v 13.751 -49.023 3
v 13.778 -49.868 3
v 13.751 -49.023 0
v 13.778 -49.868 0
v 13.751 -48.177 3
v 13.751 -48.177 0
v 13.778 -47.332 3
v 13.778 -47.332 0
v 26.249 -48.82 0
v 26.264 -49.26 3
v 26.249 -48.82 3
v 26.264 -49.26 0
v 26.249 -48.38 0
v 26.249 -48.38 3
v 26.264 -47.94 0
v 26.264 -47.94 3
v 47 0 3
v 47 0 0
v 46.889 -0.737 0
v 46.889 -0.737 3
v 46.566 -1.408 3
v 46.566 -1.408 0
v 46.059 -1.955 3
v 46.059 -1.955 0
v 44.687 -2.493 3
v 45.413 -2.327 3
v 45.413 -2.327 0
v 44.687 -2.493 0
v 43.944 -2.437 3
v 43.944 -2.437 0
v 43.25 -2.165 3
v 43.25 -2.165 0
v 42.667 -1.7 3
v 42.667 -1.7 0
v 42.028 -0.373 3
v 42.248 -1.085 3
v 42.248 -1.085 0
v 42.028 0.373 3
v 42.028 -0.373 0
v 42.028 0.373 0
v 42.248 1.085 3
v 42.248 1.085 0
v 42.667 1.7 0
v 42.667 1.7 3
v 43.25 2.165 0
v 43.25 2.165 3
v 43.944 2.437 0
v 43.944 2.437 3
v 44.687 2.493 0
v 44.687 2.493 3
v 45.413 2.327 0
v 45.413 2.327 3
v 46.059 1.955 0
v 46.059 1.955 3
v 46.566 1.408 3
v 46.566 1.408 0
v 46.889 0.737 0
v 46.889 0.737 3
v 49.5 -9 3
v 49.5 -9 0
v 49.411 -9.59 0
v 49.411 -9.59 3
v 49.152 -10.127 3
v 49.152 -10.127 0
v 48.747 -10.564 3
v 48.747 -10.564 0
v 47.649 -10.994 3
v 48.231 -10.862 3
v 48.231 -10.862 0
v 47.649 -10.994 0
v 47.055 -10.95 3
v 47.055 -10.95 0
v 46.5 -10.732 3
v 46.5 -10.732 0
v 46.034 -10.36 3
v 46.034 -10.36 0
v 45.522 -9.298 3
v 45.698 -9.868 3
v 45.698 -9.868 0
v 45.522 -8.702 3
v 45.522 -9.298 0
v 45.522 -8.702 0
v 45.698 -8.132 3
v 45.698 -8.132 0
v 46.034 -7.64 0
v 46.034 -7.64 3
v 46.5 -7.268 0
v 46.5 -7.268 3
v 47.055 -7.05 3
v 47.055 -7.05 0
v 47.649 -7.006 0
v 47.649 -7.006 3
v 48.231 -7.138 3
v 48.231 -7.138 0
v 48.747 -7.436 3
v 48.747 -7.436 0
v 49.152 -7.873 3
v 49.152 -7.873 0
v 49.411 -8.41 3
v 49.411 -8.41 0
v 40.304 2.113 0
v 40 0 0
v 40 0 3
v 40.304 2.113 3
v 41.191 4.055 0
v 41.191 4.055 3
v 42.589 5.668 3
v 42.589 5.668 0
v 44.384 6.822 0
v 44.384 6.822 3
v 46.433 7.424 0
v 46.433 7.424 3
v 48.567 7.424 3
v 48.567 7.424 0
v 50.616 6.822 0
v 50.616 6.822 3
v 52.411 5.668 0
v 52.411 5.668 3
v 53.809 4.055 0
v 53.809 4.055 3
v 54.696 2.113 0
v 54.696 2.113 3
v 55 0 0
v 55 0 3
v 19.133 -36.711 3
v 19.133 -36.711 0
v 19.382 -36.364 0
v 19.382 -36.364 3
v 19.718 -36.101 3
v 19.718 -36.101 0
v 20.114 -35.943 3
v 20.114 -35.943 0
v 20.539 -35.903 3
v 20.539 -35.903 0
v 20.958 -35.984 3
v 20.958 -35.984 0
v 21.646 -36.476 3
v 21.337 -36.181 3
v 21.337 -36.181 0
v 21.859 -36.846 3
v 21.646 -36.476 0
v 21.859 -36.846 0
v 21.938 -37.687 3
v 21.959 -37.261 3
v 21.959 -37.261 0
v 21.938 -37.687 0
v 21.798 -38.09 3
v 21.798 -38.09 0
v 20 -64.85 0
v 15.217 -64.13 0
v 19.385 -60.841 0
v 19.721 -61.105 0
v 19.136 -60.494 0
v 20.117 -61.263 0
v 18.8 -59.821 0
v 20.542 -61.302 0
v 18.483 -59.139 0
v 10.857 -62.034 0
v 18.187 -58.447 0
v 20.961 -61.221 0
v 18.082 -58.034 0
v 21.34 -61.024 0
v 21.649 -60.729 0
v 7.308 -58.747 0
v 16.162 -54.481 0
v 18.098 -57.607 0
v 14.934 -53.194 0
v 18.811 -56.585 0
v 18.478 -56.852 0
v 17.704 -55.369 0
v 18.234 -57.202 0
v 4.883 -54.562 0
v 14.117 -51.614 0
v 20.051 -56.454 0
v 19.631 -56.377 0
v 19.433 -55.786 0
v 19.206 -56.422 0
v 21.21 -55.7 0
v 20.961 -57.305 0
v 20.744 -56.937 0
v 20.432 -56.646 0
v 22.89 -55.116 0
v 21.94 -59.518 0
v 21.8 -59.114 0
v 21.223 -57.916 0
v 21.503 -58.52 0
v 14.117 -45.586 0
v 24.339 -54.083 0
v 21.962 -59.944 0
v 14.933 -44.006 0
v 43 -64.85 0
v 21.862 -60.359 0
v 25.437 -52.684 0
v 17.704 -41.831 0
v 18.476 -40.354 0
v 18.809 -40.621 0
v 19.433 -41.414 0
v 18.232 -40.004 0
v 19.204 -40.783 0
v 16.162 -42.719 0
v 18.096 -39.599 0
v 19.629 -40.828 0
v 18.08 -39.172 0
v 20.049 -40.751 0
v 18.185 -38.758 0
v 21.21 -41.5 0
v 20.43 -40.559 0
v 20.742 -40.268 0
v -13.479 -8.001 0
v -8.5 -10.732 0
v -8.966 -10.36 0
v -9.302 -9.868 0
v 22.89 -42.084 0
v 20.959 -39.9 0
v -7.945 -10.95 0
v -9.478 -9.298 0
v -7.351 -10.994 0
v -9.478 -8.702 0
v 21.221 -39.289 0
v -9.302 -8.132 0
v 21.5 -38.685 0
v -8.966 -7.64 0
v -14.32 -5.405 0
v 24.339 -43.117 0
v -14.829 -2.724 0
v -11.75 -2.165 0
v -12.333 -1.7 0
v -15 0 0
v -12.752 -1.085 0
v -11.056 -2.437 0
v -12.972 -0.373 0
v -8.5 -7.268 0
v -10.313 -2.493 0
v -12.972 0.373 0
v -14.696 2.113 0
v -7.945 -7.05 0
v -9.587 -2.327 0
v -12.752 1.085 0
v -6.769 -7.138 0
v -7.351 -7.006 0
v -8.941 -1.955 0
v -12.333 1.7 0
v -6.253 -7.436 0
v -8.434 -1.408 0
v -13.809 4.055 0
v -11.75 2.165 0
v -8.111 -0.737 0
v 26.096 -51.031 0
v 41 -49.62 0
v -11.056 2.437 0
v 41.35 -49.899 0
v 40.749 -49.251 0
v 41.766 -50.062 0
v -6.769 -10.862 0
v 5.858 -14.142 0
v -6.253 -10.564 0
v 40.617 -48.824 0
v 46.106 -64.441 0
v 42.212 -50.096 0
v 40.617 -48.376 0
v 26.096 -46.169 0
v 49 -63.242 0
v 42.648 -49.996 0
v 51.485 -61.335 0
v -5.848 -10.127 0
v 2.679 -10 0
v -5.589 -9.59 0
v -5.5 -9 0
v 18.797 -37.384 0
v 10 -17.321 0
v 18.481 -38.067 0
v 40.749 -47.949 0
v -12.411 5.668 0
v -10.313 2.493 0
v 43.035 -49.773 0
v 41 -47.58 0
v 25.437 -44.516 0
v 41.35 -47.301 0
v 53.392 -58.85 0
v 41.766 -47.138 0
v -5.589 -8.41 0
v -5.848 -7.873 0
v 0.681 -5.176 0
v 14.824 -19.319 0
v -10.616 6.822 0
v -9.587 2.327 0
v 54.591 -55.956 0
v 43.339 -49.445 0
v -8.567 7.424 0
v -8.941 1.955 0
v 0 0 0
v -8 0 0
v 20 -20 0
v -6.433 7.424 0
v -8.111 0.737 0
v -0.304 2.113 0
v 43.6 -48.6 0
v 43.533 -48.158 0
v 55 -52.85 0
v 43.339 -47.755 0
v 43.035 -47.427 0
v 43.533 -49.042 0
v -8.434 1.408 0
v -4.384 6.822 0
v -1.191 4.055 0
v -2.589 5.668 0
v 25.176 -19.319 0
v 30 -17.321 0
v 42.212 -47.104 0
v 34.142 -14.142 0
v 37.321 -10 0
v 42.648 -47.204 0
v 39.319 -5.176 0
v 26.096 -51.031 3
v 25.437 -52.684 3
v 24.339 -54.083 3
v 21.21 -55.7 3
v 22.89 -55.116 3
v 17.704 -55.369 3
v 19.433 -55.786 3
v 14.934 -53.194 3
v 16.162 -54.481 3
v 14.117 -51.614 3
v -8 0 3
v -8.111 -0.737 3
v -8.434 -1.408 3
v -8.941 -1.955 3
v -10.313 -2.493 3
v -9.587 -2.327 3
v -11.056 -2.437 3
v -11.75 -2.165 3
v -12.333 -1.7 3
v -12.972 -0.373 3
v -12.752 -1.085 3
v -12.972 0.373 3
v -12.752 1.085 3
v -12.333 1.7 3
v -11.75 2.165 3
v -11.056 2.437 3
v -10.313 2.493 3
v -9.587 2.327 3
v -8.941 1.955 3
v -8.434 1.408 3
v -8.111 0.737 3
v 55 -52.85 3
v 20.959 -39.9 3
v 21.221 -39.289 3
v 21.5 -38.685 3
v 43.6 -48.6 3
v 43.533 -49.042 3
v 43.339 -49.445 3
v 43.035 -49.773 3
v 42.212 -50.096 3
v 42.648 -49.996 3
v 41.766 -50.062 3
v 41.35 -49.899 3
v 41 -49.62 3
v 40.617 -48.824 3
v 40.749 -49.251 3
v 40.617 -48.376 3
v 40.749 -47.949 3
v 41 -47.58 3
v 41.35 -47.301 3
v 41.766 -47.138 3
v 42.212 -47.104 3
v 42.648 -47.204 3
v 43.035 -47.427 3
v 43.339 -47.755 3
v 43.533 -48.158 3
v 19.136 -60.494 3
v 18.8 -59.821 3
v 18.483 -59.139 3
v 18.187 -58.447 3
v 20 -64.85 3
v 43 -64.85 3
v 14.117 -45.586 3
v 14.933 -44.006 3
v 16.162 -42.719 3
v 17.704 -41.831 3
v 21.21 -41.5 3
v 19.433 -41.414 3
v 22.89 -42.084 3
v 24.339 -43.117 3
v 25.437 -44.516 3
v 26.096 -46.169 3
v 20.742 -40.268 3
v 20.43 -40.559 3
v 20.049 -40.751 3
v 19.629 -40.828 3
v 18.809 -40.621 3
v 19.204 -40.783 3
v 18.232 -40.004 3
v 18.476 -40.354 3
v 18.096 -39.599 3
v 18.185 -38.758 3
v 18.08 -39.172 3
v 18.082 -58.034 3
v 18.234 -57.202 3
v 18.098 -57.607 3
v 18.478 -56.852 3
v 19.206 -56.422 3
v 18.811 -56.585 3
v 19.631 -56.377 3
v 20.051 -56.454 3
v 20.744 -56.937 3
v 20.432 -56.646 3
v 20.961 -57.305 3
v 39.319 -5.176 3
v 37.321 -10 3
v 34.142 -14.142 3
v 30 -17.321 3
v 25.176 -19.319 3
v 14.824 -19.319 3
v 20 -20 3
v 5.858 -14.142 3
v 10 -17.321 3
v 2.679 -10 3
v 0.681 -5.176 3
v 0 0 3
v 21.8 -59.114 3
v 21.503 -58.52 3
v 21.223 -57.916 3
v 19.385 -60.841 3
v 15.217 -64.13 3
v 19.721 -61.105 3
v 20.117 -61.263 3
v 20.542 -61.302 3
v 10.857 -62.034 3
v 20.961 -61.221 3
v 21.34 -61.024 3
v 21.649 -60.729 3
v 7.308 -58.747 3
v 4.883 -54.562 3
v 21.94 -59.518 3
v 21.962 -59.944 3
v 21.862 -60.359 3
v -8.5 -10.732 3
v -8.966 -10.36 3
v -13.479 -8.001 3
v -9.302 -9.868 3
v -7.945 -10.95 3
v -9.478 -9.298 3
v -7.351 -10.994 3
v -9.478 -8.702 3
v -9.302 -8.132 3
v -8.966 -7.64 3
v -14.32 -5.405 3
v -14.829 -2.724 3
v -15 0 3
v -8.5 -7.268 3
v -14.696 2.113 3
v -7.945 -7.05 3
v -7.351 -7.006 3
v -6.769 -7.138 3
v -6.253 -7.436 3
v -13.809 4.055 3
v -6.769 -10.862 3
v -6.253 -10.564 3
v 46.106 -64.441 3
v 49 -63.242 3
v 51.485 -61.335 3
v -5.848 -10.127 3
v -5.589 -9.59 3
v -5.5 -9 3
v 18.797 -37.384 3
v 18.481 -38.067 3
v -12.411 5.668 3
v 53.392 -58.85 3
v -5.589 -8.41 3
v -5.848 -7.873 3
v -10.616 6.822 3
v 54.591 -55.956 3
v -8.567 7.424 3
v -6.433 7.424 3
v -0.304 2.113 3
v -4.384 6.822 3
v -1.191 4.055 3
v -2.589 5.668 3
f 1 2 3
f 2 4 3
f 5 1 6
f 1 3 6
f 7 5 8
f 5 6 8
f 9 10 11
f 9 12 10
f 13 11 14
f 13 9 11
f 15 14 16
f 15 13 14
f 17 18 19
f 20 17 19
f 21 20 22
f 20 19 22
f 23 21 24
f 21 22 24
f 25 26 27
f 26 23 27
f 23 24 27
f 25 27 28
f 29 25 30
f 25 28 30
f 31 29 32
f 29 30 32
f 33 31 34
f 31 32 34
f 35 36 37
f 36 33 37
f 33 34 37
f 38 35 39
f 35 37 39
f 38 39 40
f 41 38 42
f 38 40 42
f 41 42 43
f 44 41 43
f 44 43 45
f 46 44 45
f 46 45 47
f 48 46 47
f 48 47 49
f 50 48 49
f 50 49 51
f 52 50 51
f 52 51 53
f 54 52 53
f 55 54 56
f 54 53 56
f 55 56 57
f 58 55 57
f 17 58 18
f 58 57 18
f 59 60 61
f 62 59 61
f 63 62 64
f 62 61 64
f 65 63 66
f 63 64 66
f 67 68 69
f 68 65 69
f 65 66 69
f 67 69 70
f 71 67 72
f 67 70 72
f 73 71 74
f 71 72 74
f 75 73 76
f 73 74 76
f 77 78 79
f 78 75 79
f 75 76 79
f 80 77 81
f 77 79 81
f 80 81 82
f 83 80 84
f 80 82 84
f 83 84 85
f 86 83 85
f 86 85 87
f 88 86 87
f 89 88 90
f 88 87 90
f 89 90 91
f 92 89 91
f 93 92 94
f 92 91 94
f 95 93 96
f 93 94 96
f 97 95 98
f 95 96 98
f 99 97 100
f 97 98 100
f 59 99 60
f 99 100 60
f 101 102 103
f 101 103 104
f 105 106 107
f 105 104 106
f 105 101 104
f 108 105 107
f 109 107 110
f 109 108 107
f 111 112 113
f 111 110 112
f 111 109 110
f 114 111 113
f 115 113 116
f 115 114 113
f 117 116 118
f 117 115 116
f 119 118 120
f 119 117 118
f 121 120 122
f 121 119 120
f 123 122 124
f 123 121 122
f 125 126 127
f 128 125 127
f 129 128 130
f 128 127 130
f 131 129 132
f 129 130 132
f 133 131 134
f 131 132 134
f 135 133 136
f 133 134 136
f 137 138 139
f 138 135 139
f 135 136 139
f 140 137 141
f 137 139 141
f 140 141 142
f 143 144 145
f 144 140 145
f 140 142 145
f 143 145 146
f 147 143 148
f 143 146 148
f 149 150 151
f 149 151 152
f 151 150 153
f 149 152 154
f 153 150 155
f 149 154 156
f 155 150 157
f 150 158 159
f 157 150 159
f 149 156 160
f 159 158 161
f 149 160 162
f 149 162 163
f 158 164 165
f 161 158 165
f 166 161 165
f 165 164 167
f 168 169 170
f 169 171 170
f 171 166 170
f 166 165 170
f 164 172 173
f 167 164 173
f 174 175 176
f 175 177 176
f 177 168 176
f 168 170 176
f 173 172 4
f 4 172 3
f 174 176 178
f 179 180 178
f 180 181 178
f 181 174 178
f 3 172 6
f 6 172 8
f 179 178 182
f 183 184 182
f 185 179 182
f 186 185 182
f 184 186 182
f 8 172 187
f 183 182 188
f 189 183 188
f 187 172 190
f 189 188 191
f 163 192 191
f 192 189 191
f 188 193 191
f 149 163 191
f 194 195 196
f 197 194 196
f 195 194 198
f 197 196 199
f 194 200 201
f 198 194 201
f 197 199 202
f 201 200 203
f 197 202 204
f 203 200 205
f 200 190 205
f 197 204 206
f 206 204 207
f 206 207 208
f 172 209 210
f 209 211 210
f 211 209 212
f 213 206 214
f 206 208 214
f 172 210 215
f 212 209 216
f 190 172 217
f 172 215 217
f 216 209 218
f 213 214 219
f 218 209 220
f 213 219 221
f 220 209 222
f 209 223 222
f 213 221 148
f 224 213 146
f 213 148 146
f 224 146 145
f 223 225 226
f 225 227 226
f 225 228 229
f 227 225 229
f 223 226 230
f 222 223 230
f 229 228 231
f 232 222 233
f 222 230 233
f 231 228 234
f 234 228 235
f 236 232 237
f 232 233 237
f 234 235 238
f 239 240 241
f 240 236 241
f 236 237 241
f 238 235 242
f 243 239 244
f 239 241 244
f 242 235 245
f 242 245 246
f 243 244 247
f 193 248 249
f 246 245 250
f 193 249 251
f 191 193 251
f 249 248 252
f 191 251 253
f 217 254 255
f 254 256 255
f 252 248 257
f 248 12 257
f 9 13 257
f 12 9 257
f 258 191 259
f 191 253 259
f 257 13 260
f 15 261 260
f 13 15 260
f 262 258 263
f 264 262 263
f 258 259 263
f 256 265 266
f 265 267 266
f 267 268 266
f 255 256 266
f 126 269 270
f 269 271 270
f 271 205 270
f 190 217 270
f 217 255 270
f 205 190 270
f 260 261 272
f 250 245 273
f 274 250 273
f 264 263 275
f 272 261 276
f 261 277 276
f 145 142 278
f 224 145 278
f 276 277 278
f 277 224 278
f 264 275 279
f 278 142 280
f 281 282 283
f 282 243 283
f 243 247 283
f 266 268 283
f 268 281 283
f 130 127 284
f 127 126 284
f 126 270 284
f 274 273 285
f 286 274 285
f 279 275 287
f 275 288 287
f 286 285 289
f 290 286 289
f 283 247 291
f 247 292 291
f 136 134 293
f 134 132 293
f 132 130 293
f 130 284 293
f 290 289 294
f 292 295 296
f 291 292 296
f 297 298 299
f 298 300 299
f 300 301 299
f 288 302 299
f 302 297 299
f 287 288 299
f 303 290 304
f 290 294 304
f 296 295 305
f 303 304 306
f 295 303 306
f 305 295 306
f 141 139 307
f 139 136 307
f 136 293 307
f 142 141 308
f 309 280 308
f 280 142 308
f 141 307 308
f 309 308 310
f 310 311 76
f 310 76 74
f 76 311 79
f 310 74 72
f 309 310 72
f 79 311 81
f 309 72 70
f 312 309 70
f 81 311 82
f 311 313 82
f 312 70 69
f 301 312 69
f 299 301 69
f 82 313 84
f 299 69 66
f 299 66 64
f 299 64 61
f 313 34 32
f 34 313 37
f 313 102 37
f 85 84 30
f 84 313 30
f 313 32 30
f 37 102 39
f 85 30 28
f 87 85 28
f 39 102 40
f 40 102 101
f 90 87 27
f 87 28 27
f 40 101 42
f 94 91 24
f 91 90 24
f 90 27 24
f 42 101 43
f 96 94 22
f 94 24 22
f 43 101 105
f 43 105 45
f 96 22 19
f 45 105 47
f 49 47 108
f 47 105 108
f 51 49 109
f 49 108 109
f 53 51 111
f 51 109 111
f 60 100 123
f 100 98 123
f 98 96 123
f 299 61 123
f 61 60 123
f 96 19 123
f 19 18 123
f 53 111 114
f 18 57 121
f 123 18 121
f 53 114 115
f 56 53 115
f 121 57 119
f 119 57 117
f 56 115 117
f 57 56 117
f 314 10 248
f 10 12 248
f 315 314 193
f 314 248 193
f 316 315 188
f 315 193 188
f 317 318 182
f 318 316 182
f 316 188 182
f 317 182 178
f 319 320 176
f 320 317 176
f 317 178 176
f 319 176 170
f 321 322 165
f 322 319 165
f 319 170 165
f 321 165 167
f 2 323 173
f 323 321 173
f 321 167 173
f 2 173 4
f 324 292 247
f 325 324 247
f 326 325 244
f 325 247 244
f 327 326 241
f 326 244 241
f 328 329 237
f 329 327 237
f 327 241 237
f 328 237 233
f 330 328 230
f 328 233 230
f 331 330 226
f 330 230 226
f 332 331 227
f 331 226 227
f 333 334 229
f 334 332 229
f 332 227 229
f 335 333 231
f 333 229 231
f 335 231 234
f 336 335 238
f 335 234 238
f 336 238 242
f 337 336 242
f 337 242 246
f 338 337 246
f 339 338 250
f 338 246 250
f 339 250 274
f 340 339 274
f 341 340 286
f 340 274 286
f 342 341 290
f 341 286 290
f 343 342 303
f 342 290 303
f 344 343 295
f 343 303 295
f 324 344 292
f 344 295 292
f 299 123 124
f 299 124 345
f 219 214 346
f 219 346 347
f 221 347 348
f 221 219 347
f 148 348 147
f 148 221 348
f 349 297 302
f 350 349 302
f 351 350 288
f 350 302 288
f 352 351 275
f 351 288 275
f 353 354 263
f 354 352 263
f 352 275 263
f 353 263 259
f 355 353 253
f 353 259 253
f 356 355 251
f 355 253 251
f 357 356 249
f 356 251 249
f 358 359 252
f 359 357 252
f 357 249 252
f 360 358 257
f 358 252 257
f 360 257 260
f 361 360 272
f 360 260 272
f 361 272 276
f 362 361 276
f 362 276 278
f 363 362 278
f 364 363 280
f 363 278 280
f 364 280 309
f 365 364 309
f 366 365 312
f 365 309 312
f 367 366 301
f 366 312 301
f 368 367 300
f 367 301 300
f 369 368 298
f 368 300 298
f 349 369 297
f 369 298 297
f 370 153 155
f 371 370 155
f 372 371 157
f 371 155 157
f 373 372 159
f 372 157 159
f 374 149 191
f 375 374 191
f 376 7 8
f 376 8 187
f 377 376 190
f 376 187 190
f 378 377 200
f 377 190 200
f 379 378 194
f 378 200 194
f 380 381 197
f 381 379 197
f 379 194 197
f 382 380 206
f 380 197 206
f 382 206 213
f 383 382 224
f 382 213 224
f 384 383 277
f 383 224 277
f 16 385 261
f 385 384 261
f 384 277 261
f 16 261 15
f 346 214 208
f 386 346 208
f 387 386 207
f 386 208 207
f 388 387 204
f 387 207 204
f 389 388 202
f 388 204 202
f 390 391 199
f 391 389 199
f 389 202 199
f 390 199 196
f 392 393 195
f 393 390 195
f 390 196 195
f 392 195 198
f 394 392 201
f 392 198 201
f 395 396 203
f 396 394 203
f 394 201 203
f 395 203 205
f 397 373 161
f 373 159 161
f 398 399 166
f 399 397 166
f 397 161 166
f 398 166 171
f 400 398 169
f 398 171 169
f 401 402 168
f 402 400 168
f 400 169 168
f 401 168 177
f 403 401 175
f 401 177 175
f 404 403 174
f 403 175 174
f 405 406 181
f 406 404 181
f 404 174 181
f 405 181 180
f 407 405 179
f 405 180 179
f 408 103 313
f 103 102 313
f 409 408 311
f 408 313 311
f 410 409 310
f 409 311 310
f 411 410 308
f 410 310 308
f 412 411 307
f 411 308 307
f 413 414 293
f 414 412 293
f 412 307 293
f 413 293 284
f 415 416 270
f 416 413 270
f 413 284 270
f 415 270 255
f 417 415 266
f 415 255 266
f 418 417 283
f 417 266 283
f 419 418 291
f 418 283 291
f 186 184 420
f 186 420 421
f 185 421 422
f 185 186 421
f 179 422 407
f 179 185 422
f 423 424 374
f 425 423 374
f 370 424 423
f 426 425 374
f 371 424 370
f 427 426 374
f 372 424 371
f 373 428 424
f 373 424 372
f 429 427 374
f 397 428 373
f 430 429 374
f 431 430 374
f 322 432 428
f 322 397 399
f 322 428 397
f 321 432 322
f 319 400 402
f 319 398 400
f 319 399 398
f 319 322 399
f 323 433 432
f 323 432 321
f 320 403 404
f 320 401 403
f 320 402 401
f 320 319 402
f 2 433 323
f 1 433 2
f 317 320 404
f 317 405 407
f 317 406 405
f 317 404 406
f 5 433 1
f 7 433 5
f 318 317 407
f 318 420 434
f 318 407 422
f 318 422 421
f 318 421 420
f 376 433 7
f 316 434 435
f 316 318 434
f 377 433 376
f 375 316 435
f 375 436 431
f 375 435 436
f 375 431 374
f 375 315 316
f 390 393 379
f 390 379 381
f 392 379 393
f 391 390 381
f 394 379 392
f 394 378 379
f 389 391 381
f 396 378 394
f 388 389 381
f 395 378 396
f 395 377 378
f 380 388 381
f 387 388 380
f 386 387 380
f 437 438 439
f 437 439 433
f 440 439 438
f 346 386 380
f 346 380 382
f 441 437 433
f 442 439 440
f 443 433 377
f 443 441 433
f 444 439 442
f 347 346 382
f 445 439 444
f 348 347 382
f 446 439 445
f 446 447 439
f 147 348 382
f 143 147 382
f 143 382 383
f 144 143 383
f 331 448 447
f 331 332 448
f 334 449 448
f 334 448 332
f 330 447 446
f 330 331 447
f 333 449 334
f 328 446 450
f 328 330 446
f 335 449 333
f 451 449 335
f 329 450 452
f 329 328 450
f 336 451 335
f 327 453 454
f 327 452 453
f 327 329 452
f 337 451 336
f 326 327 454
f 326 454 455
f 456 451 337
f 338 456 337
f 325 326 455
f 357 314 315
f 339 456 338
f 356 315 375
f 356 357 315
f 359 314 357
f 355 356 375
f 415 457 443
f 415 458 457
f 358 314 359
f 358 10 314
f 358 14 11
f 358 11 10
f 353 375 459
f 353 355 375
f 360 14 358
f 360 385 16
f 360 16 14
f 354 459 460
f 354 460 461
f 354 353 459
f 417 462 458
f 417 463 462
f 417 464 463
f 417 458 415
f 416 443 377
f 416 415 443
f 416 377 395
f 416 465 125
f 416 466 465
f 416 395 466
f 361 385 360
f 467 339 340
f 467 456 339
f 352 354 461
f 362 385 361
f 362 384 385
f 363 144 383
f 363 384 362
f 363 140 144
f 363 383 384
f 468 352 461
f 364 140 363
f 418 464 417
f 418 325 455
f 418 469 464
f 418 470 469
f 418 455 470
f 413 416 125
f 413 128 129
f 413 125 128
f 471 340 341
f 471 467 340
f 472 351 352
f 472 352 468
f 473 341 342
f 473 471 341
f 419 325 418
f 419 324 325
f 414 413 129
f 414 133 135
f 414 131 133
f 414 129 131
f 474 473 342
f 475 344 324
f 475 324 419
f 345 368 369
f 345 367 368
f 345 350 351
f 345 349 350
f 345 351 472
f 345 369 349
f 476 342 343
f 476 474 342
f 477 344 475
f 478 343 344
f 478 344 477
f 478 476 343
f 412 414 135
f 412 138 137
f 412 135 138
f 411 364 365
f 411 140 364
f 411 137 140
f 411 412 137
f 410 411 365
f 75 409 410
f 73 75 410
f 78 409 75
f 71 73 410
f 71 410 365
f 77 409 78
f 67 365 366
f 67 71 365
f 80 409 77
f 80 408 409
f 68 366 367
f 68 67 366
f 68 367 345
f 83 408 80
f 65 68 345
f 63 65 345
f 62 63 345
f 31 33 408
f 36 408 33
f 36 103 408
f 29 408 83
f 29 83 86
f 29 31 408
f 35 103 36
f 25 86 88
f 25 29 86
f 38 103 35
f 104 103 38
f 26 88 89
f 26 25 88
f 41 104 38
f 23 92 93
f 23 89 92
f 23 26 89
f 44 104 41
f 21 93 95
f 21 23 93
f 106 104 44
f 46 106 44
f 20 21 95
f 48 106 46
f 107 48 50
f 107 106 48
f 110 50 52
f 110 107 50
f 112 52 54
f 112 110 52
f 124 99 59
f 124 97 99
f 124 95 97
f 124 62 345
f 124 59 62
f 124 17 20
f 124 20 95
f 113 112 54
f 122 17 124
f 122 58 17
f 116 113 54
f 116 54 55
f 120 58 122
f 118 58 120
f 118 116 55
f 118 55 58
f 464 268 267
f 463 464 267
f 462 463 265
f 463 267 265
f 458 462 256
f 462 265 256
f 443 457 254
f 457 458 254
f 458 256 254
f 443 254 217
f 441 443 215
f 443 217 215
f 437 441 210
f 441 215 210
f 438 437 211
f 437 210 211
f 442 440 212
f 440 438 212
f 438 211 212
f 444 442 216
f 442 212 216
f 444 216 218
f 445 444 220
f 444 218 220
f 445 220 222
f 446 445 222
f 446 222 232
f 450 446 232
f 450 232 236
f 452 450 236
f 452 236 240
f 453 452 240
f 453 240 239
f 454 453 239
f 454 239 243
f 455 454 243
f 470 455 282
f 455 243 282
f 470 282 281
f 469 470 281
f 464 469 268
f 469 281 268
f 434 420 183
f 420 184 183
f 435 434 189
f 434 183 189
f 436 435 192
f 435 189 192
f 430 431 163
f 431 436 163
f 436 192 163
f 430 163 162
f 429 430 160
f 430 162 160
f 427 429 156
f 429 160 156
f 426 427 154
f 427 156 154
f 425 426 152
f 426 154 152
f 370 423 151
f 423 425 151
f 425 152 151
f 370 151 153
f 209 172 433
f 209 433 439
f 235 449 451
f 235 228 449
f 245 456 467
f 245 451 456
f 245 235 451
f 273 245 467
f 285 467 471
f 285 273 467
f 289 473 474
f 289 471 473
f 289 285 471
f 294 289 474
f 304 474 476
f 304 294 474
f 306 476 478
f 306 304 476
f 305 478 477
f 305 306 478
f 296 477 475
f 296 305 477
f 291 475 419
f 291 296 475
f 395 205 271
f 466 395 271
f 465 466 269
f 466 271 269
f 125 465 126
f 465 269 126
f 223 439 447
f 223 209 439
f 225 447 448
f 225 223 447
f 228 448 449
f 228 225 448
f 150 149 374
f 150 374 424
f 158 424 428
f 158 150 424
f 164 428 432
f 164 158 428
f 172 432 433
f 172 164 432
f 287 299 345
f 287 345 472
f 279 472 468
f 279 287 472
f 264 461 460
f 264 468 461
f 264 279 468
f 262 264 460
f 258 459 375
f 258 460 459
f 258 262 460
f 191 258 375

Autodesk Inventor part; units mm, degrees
ref_plane "YZ Plane" through (0, 0, 0) normal (1, 0, 0) x (0, 1, 0)
ref_plane "XZ Plane" through (0, 0, 0) normal (0, 1, 0) x (-1, 0, 0)
ref_plane "XY Plane" through (0, 0, 0) normal (0, 0, 1) x (1, 0, 0)
sketch "Sketch1" plane through (0, 0, 0) normal (0, 0, 1) x (1, 0, 0)
  line L0 (-15, 13.1624) -> (0, 13.1624) construction
  line L1 (-15, -13.1624) -> (-15, 13.1624) construction
  line L2 (0, -13.1624) -> (-15, -13.1624) construction
  line L3 (0, 13.1624) -> (0, -13.1624) construction
  circle A0 centre (20, -58.85) radius 1.2295 construction
  circle A1 centre (20, -38.35) radius 1.2295 construction
  circle A2 centre (42.1, -48.6) radius 1.2295 construction
  circle A3 centre (20, -48.6) radius 6 construction
  circle A4 centre (20, 0) radius 4 construction
  line L4 (40, 13.1624) -> (55, 13.1624) construction
  line L5 (40, -13.1624) -> (40, 13.1624) construction
  line L6 (55, -13.1624) -> (40, -13.1624) construction
  line L7 (55, 13.1624) -> (55, -13.1624) construction
  arc A5 (0, 0) -> (-15, 0) centre (-7.5, 0) ccw
  arc A6 (55, 0) -> (40, 0) centre (47.5, 0) ccw
  arc A7 (0, 0) -> (40, 0) centre (20, 0) ccw
  line L8 (53.51, -48.6) -> (3.95, -48.6) construction
  line L9 (20, -64.85) -> (43, -64.85)
  line L10 (55, 0) -> (55, -52.85)
  arc A8 (43, -64.85) -> (55, -52.85) centre (43, -52.85) ccw
  line L11 (4.8831, -54.5617) -> (-13.4793, -8.001)
  arc A9 (4.8831, -54.5617) -> (20, -64.85) centre (20, -48.6) ccw
  arc A10 (-15, 0) -> (-13.4793, -8.001) centre (6.8084, 0) ccw
  circle A11 centre (42.1, -48.6) radius 1.5
  arc A12 (19.1333, -36.7114) -> (18.1846, -38.7583) centre (42.1, -48.6) ccw
  arc A13 (21.7975, -38.0905) -> (20.9588, -39.9) centre (42.1, -48.6) ccw
  arc A14 (20.9609, -57.3051) -> (21.8001, -59.1144) centre (42.1, -48.6) ccw construction
  arc A15 (18.1869, -58.4474) -> (19.1362, -60.4941) centre (42.1, -48.6) ccw
  arc A16 (19.1362, -60.4941) -> (21.8001, -59.1144) centre (20.4681, -59.8042) ccw
  arc A17 (20.9609, -57.3051) -> (18.1869, -58.4474) centre (19.5739, -57.8763) ccw
  arc A18 (18.1846, -38.7583) -> (20.9588, -39.9) centre (19.5717, -39.3292) ccw
  arc A19 (21.7975, -38.0905) -> (19.1333, -36.7114) centre (20.4654, -37.401) ccw
  arc A20 (19.5739, -57.8763) -> (20.4681, -59.8042) centre (42.1, -48.6) ccw construction
  arc A21 (20.4654, -37.401) -> (19.5717, -39.3292) centre (42.1, -48.6) ccw construction
  arc A22 (20.9609, -57.3051) -> (21.8001, -59.1144) centre (42.1, -48.6) ccw
  arc A23 (13.7784, -47.3325) -> (13.7784, -49.8675) centre (39.8451, -48.6) ccw
  arc A24 (26.2637, -47.9396) -> (26.2637, -49.2604) centre (39.8451, -48.6) ccw
  arc A25 (13.7784, -49.8675) -> (26.2637, -49.2604) centre (20.021, -49.564) ccw
  arc A26 (26.2637, -47.9396) -> (13.7784, -47.3325) centre (20.021, -47.636) ccw
  arc A27 (20.021, -47.636) -> (20.021, -49.564) centre (42.1, -48.6) ccw construction
  circle A28 centre (-7.5, -9) radius 1.7295
  circle A29 centre (47.5, -9) radius 1.7295
  circle A30 centre (47.5, -9) radius 2
  circle A31 centre (-7.5, -9) radius 2
  circle A32 centre (-10.5, 0) radius 2.067
  circle A33 centre (44.5, 0) radius 2.067
  circle A34 centre (-10.5, 0) radius 2.5
  circle A35 centre (44.5, 0) radius 2.5
extrude "Extrusion1" add sketch "Sketch1" along normal blind 3 contours A7 A6 L10 A8 L9 A9 L11 A10 A5
properties part number "motor plate"
